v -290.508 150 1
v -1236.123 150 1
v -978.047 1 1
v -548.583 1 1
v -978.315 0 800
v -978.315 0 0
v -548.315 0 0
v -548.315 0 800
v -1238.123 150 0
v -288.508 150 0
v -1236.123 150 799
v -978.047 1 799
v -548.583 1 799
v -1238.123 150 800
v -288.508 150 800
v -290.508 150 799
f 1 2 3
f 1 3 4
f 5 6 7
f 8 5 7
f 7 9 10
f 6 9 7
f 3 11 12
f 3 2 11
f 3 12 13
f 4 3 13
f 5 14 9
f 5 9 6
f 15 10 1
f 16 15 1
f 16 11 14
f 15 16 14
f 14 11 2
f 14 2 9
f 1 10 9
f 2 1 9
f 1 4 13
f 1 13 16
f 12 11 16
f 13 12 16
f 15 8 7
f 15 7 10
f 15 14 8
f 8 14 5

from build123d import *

# Parameters (mm, degrees)
BOSS_EXTRUDE1_DEPTH = 800
SHELL1_T            = -1


with BuildPart() as part:
    # Sketch1 → Boss-Extrude1 (new body)
    with BuildSketch(Plane.XY):
        Polygon((-978.315410822, 0), (-548.315410822, 0), (-288.507789686, 150), (-1238.123031957, 150), align=None)
    extrude(amount=BOSS_EXTRUDE1_DEPTH)

    # Shell1
    shell1_openings = [part.faces().sort_by_distance(p)[0] for p in [
        (-763.315410822, 150, 400),
    ]]
    offset(amount=SHELL1_T, openings=shell1_openings, kind=Kind.INTERSECTION)


solid = part.part
